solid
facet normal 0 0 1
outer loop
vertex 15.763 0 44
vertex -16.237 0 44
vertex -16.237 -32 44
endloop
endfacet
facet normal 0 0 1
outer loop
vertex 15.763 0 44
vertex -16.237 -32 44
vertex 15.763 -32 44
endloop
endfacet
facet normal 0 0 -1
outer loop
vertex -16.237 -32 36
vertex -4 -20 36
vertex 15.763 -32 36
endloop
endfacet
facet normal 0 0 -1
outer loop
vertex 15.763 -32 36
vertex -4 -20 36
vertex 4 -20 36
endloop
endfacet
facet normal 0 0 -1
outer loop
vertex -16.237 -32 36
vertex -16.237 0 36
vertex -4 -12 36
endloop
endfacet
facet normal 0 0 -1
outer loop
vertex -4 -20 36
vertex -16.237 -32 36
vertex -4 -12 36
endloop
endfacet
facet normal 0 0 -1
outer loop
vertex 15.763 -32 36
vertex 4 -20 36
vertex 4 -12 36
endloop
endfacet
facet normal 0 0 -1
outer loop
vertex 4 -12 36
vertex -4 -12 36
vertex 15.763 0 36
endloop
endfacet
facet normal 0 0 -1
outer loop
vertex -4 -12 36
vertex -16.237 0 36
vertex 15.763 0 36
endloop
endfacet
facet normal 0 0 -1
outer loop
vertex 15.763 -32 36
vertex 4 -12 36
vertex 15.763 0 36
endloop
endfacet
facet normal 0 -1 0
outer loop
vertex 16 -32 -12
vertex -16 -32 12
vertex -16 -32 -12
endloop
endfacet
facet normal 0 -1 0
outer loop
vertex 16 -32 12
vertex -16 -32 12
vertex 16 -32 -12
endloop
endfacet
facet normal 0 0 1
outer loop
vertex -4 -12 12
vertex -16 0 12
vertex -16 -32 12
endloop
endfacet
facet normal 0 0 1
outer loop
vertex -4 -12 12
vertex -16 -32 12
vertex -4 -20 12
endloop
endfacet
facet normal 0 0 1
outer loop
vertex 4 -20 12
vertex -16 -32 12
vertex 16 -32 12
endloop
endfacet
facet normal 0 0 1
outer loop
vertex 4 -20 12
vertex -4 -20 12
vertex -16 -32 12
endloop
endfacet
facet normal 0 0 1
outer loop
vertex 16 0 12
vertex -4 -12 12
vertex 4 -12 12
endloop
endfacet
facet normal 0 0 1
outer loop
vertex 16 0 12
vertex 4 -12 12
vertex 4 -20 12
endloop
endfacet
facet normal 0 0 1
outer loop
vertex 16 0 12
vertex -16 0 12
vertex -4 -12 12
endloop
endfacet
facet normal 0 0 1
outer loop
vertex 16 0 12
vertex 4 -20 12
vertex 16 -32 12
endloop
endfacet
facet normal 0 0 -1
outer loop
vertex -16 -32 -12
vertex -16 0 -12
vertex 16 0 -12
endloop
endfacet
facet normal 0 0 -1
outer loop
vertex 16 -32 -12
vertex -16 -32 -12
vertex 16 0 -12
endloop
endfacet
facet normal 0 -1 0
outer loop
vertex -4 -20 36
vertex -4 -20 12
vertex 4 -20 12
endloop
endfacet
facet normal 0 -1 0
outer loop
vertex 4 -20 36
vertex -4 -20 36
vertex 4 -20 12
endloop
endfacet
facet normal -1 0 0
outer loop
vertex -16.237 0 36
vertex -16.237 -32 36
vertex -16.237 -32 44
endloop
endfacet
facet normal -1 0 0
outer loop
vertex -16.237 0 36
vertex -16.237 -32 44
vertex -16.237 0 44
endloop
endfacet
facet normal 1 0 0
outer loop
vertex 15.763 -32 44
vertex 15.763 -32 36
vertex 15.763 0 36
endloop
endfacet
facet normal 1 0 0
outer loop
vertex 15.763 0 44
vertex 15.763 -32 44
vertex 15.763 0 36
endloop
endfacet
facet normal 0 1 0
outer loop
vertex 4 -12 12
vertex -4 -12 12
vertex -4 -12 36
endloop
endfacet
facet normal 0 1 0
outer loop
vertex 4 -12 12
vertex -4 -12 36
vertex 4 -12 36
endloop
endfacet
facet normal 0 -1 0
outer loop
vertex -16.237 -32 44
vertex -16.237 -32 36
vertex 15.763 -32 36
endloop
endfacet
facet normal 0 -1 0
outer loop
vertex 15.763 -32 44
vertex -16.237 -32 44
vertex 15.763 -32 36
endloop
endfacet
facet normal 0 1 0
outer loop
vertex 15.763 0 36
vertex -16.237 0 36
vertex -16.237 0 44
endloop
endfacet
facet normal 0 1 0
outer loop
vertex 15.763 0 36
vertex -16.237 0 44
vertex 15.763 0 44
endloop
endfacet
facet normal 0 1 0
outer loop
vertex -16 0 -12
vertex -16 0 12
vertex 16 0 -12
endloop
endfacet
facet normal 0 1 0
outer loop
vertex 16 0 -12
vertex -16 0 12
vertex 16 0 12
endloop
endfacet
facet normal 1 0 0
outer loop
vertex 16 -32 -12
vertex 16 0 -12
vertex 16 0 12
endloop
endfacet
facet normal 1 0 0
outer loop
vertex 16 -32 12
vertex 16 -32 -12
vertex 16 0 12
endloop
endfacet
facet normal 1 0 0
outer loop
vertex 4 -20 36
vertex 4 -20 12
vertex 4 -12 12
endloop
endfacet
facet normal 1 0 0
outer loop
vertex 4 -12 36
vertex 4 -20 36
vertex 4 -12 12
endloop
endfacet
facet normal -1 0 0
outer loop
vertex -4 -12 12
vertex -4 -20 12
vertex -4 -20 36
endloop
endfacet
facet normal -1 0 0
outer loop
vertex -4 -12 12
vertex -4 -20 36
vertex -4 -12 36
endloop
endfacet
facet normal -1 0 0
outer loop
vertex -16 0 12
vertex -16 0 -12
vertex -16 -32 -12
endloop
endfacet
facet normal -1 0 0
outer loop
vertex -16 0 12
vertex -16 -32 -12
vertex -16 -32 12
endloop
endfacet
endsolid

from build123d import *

# Parameters (mm, degrees)
F0_W     = 32
F0_H     = 24
F1_DEPTH = 32
F2_W     = 8
F2_H     = 8
F3_DEPTH = 24
F4_W     = 32
F4_H     = 32
F5_DEPTH = 8


with BuildPart() as f1:
    # F0 (on Front) → F1 (new body)
    with BuildSketch(Plane.XZ):
        Rectangle(F0_W, F0_H)
    extrude(amount=F1_DEPTH)

    # F2 (on face) → F3 (join)
    with BuildSketch(Plane.XY.offset(12)):
        with Locations((0, -16)):
            Rectangle(F2_W, F2_H)
    extrude(amount=F3_DEPTH)

    # F4 (on face) → F5 (join)
    with BuildSketch(Plane.XY.offset(36)):
        with Locations((-0.237114, -16)):
            Rectangle(F4_W, F4_H)
    extrude(amount=F5_DEPTH)


solid = f1.part
